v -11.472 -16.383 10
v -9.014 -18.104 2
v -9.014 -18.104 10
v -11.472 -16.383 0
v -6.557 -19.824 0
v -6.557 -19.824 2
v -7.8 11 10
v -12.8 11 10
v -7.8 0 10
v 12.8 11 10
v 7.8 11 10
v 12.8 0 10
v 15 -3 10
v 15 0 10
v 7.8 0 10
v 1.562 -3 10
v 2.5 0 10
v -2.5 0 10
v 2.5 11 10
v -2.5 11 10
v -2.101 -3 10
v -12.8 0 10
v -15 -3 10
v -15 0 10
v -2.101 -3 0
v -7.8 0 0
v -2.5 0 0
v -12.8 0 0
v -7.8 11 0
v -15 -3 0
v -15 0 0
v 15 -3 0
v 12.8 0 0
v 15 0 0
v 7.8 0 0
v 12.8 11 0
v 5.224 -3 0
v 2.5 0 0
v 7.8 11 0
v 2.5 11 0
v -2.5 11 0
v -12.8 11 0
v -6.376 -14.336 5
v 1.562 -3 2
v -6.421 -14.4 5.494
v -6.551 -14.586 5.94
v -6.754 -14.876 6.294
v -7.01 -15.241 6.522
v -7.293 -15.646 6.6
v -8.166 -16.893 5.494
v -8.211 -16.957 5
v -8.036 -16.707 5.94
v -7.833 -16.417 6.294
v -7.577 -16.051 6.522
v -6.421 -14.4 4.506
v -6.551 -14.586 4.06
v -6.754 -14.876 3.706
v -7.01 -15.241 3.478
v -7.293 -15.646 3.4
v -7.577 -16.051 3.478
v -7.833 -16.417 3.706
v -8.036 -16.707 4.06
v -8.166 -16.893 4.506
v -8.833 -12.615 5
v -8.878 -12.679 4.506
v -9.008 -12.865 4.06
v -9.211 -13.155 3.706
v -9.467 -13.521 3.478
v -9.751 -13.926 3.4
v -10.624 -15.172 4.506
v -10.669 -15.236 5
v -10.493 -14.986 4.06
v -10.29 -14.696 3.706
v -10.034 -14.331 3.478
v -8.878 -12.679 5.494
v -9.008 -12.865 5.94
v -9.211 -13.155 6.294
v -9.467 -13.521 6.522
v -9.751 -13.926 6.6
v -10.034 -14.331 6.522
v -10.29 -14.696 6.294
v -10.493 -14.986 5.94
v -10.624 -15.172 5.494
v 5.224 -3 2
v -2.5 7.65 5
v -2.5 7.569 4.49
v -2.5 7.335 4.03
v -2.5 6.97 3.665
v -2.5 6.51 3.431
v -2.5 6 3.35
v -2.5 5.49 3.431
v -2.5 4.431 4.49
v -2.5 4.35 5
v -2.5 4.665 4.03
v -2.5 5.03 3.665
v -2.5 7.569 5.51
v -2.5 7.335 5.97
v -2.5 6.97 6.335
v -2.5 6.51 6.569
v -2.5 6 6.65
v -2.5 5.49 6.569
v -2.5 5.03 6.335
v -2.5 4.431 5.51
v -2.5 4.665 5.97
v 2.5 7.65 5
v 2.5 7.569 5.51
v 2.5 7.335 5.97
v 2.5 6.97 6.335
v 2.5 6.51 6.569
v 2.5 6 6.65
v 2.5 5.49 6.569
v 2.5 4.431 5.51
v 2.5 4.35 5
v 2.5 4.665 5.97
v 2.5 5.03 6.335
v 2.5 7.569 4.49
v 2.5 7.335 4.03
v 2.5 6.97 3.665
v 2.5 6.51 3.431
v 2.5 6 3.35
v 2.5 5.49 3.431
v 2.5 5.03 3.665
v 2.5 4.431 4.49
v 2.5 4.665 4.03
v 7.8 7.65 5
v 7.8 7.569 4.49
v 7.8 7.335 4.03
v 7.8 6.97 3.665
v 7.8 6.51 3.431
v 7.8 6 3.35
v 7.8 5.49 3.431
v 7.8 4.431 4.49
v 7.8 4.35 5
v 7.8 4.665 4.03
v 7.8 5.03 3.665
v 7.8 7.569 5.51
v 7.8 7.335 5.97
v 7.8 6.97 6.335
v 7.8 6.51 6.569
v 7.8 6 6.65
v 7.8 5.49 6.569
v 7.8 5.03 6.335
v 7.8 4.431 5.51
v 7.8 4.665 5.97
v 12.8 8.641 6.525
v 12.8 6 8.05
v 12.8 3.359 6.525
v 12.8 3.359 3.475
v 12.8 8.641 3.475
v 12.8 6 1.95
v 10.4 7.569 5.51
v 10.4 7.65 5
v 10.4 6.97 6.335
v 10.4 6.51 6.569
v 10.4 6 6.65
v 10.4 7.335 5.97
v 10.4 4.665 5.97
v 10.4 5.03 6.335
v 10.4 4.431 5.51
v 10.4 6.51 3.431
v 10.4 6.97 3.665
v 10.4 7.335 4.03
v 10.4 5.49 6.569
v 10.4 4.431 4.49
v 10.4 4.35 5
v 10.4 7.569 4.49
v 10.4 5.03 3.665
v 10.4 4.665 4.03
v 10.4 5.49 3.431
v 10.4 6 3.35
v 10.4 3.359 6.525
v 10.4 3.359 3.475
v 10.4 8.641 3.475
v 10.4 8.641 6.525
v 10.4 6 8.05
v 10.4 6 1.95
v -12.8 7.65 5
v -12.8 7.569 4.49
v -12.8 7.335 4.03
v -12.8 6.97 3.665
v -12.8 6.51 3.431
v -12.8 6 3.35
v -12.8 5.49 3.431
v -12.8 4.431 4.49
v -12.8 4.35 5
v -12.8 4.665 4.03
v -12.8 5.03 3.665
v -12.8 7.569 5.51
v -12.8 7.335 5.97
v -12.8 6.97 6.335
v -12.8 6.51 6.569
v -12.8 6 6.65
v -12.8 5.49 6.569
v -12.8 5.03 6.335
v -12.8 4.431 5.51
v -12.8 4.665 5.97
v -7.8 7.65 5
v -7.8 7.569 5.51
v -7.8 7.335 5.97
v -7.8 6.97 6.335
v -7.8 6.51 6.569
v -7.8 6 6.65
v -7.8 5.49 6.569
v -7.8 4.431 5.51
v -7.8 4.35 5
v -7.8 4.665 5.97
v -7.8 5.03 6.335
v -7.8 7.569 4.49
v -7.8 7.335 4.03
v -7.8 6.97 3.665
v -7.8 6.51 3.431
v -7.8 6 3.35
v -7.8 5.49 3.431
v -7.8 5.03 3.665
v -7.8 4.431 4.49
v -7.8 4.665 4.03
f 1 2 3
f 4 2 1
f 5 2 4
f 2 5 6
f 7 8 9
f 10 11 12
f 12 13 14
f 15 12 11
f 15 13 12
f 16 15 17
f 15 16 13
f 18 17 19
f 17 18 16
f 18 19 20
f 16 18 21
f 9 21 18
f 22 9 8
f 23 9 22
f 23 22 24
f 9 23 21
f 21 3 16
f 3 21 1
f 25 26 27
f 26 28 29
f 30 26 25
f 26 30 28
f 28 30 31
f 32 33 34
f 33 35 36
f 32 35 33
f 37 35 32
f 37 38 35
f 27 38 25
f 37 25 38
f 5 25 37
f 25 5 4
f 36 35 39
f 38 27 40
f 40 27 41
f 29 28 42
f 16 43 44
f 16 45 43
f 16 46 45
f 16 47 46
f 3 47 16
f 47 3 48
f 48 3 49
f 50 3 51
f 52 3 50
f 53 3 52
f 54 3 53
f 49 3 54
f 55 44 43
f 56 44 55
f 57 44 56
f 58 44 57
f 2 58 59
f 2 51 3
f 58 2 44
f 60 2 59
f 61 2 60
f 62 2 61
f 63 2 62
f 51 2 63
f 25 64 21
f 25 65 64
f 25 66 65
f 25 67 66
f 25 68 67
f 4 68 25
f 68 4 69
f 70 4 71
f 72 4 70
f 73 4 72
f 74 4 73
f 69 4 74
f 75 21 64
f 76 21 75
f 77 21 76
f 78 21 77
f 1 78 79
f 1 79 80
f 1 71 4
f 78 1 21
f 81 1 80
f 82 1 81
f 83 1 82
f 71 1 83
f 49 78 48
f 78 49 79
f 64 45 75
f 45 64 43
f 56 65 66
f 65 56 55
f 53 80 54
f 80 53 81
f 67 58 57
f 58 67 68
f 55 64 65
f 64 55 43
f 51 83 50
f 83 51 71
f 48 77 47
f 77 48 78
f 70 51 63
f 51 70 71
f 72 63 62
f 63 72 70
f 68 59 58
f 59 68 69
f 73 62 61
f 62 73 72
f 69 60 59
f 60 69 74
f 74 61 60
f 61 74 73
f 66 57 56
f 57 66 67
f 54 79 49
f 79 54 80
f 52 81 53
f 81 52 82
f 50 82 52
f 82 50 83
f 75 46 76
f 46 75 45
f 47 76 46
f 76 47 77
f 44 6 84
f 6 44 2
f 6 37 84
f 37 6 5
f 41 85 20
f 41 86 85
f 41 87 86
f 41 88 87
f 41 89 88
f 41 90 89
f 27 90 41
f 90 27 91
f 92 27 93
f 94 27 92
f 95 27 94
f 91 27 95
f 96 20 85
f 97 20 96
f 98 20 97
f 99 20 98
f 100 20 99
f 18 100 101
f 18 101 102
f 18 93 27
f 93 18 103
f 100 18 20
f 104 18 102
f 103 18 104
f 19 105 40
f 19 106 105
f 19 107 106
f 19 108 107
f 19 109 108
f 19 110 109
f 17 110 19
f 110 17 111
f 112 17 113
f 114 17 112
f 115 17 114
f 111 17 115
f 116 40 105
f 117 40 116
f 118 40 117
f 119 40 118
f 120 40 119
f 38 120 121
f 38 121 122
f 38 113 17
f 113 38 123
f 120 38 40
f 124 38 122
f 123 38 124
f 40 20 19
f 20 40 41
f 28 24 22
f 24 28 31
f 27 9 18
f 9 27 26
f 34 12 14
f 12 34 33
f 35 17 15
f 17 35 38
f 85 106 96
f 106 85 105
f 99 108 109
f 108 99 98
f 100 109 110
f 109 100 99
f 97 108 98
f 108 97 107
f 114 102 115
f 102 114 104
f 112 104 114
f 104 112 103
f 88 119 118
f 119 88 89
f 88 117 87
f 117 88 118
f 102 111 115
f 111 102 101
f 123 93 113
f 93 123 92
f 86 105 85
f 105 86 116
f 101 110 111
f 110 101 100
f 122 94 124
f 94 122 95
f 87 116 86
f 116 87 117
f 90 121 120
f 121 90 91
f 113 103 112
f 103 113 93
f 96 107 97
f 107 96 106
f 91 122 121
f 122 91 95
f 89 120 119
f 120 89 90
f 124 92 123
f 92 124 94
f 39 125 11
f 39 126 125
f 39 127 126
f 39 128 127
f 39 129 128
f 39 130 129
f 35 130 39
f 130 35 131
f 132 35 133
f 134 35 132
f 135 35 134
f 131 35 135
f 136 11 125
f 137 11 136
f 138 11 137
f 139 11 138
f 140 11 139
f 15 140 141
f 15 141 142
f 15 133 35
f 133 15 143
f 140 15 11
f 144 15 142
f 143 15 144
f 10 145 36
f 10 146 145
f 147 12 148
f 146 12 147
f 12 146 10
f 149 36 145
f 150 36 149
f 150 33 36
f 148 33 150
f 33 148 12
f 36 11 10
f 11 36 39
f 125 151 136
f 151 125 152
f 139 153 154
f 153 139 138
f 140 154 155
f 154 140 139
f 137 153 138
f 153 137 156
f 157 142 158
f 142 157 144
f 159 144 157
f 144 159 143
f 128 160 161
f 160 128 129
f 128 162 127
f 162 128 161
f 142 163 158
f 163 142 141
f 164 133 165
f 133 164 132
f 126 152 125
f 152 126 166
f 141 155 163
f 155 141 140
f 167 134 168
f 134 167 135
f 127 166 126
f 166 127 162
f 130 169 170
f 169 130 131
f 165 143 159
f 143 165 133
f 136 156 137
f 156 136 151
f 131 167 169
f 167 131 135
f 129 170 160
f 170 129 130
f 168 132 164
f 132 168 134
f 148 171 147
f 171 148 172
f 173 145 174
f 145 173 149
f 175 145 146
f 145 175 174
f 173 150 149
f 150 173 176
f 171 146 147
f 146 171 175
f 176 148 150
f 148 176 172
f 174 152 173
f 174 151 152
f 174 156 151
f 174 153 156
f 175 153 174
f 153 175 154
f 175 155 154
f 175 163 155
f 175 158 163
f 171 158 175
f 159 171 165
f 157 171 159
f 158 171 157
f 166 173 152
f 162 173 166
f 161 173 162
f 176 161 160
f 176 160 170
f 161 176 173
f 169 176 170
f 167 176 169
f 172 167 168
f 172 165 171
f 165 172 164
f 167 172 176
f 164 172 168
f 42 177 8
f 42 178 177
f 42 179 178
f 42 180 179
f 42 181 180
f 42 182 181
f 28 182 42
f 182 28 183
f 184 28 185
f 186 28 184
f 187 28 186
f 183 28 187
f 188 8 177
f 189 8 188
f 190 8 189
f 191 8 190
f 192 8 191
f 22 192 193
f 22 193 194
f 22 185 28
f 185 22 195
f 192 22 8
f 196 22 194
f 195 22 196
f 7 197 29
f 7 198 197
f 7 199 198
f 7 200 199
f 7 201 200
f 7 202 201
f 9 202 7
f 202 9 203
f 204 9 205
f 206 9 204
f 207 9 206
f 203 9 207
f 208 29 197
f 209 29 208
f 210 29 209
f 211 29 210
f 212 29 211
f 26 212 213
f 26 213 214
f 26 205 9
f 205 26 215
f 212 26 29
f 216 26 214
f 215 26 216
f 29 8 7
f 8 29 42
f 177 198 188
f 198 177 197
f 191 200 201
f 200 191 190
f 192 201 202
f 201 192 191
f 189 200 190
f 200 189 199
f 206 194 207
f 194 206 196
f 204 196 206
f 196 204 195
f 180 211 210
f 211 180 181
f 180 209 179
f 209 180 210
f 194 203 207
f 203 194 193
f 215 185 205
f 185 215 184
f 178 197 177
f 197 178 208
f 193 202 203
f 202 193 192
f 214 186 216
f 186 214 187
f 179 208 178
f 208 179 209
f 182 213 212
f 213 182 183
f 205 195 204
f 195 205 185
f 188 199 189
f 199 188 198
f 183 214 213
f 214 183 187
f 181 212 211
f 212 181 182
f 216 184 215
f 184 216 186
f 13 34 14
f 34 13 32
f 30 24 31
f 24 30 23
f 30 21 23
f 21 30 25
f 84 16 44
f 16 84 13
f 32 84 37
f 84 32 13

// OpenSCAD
module fan_pad(nut = false){
rotate([0,-90,0])
difference(){
if(nut){
cube([10,11,5]);
}else{
cube([10,11,5]);
}
translate([5,6])cylinder(r=3.3/2,h=6,$fn=20);
if (nut)
#translate([5,6,-0.1])cylinder(r=6.1/2,h=2.5,$fn=6);

}

}
module holder(){
translate([-1,0,0])cube([21,6,2]);
difference(){
color([0.0,0.2,0,0.2])cube([20,3,10]);

translate([20-3,-1,5])rotate([-90,0,0])cylinder(r=3.2/2,h=10,$fn=20);
}

}


rotate([0,0,-90-35])holder();
translate([-15,-3,0])cube([30,3,10]);
translate([2.5,0])fan_pad();
translate([2.5+5.3+5,0])fan_pad(true);
translate([-2.5-5.3,0])fan_pad();
